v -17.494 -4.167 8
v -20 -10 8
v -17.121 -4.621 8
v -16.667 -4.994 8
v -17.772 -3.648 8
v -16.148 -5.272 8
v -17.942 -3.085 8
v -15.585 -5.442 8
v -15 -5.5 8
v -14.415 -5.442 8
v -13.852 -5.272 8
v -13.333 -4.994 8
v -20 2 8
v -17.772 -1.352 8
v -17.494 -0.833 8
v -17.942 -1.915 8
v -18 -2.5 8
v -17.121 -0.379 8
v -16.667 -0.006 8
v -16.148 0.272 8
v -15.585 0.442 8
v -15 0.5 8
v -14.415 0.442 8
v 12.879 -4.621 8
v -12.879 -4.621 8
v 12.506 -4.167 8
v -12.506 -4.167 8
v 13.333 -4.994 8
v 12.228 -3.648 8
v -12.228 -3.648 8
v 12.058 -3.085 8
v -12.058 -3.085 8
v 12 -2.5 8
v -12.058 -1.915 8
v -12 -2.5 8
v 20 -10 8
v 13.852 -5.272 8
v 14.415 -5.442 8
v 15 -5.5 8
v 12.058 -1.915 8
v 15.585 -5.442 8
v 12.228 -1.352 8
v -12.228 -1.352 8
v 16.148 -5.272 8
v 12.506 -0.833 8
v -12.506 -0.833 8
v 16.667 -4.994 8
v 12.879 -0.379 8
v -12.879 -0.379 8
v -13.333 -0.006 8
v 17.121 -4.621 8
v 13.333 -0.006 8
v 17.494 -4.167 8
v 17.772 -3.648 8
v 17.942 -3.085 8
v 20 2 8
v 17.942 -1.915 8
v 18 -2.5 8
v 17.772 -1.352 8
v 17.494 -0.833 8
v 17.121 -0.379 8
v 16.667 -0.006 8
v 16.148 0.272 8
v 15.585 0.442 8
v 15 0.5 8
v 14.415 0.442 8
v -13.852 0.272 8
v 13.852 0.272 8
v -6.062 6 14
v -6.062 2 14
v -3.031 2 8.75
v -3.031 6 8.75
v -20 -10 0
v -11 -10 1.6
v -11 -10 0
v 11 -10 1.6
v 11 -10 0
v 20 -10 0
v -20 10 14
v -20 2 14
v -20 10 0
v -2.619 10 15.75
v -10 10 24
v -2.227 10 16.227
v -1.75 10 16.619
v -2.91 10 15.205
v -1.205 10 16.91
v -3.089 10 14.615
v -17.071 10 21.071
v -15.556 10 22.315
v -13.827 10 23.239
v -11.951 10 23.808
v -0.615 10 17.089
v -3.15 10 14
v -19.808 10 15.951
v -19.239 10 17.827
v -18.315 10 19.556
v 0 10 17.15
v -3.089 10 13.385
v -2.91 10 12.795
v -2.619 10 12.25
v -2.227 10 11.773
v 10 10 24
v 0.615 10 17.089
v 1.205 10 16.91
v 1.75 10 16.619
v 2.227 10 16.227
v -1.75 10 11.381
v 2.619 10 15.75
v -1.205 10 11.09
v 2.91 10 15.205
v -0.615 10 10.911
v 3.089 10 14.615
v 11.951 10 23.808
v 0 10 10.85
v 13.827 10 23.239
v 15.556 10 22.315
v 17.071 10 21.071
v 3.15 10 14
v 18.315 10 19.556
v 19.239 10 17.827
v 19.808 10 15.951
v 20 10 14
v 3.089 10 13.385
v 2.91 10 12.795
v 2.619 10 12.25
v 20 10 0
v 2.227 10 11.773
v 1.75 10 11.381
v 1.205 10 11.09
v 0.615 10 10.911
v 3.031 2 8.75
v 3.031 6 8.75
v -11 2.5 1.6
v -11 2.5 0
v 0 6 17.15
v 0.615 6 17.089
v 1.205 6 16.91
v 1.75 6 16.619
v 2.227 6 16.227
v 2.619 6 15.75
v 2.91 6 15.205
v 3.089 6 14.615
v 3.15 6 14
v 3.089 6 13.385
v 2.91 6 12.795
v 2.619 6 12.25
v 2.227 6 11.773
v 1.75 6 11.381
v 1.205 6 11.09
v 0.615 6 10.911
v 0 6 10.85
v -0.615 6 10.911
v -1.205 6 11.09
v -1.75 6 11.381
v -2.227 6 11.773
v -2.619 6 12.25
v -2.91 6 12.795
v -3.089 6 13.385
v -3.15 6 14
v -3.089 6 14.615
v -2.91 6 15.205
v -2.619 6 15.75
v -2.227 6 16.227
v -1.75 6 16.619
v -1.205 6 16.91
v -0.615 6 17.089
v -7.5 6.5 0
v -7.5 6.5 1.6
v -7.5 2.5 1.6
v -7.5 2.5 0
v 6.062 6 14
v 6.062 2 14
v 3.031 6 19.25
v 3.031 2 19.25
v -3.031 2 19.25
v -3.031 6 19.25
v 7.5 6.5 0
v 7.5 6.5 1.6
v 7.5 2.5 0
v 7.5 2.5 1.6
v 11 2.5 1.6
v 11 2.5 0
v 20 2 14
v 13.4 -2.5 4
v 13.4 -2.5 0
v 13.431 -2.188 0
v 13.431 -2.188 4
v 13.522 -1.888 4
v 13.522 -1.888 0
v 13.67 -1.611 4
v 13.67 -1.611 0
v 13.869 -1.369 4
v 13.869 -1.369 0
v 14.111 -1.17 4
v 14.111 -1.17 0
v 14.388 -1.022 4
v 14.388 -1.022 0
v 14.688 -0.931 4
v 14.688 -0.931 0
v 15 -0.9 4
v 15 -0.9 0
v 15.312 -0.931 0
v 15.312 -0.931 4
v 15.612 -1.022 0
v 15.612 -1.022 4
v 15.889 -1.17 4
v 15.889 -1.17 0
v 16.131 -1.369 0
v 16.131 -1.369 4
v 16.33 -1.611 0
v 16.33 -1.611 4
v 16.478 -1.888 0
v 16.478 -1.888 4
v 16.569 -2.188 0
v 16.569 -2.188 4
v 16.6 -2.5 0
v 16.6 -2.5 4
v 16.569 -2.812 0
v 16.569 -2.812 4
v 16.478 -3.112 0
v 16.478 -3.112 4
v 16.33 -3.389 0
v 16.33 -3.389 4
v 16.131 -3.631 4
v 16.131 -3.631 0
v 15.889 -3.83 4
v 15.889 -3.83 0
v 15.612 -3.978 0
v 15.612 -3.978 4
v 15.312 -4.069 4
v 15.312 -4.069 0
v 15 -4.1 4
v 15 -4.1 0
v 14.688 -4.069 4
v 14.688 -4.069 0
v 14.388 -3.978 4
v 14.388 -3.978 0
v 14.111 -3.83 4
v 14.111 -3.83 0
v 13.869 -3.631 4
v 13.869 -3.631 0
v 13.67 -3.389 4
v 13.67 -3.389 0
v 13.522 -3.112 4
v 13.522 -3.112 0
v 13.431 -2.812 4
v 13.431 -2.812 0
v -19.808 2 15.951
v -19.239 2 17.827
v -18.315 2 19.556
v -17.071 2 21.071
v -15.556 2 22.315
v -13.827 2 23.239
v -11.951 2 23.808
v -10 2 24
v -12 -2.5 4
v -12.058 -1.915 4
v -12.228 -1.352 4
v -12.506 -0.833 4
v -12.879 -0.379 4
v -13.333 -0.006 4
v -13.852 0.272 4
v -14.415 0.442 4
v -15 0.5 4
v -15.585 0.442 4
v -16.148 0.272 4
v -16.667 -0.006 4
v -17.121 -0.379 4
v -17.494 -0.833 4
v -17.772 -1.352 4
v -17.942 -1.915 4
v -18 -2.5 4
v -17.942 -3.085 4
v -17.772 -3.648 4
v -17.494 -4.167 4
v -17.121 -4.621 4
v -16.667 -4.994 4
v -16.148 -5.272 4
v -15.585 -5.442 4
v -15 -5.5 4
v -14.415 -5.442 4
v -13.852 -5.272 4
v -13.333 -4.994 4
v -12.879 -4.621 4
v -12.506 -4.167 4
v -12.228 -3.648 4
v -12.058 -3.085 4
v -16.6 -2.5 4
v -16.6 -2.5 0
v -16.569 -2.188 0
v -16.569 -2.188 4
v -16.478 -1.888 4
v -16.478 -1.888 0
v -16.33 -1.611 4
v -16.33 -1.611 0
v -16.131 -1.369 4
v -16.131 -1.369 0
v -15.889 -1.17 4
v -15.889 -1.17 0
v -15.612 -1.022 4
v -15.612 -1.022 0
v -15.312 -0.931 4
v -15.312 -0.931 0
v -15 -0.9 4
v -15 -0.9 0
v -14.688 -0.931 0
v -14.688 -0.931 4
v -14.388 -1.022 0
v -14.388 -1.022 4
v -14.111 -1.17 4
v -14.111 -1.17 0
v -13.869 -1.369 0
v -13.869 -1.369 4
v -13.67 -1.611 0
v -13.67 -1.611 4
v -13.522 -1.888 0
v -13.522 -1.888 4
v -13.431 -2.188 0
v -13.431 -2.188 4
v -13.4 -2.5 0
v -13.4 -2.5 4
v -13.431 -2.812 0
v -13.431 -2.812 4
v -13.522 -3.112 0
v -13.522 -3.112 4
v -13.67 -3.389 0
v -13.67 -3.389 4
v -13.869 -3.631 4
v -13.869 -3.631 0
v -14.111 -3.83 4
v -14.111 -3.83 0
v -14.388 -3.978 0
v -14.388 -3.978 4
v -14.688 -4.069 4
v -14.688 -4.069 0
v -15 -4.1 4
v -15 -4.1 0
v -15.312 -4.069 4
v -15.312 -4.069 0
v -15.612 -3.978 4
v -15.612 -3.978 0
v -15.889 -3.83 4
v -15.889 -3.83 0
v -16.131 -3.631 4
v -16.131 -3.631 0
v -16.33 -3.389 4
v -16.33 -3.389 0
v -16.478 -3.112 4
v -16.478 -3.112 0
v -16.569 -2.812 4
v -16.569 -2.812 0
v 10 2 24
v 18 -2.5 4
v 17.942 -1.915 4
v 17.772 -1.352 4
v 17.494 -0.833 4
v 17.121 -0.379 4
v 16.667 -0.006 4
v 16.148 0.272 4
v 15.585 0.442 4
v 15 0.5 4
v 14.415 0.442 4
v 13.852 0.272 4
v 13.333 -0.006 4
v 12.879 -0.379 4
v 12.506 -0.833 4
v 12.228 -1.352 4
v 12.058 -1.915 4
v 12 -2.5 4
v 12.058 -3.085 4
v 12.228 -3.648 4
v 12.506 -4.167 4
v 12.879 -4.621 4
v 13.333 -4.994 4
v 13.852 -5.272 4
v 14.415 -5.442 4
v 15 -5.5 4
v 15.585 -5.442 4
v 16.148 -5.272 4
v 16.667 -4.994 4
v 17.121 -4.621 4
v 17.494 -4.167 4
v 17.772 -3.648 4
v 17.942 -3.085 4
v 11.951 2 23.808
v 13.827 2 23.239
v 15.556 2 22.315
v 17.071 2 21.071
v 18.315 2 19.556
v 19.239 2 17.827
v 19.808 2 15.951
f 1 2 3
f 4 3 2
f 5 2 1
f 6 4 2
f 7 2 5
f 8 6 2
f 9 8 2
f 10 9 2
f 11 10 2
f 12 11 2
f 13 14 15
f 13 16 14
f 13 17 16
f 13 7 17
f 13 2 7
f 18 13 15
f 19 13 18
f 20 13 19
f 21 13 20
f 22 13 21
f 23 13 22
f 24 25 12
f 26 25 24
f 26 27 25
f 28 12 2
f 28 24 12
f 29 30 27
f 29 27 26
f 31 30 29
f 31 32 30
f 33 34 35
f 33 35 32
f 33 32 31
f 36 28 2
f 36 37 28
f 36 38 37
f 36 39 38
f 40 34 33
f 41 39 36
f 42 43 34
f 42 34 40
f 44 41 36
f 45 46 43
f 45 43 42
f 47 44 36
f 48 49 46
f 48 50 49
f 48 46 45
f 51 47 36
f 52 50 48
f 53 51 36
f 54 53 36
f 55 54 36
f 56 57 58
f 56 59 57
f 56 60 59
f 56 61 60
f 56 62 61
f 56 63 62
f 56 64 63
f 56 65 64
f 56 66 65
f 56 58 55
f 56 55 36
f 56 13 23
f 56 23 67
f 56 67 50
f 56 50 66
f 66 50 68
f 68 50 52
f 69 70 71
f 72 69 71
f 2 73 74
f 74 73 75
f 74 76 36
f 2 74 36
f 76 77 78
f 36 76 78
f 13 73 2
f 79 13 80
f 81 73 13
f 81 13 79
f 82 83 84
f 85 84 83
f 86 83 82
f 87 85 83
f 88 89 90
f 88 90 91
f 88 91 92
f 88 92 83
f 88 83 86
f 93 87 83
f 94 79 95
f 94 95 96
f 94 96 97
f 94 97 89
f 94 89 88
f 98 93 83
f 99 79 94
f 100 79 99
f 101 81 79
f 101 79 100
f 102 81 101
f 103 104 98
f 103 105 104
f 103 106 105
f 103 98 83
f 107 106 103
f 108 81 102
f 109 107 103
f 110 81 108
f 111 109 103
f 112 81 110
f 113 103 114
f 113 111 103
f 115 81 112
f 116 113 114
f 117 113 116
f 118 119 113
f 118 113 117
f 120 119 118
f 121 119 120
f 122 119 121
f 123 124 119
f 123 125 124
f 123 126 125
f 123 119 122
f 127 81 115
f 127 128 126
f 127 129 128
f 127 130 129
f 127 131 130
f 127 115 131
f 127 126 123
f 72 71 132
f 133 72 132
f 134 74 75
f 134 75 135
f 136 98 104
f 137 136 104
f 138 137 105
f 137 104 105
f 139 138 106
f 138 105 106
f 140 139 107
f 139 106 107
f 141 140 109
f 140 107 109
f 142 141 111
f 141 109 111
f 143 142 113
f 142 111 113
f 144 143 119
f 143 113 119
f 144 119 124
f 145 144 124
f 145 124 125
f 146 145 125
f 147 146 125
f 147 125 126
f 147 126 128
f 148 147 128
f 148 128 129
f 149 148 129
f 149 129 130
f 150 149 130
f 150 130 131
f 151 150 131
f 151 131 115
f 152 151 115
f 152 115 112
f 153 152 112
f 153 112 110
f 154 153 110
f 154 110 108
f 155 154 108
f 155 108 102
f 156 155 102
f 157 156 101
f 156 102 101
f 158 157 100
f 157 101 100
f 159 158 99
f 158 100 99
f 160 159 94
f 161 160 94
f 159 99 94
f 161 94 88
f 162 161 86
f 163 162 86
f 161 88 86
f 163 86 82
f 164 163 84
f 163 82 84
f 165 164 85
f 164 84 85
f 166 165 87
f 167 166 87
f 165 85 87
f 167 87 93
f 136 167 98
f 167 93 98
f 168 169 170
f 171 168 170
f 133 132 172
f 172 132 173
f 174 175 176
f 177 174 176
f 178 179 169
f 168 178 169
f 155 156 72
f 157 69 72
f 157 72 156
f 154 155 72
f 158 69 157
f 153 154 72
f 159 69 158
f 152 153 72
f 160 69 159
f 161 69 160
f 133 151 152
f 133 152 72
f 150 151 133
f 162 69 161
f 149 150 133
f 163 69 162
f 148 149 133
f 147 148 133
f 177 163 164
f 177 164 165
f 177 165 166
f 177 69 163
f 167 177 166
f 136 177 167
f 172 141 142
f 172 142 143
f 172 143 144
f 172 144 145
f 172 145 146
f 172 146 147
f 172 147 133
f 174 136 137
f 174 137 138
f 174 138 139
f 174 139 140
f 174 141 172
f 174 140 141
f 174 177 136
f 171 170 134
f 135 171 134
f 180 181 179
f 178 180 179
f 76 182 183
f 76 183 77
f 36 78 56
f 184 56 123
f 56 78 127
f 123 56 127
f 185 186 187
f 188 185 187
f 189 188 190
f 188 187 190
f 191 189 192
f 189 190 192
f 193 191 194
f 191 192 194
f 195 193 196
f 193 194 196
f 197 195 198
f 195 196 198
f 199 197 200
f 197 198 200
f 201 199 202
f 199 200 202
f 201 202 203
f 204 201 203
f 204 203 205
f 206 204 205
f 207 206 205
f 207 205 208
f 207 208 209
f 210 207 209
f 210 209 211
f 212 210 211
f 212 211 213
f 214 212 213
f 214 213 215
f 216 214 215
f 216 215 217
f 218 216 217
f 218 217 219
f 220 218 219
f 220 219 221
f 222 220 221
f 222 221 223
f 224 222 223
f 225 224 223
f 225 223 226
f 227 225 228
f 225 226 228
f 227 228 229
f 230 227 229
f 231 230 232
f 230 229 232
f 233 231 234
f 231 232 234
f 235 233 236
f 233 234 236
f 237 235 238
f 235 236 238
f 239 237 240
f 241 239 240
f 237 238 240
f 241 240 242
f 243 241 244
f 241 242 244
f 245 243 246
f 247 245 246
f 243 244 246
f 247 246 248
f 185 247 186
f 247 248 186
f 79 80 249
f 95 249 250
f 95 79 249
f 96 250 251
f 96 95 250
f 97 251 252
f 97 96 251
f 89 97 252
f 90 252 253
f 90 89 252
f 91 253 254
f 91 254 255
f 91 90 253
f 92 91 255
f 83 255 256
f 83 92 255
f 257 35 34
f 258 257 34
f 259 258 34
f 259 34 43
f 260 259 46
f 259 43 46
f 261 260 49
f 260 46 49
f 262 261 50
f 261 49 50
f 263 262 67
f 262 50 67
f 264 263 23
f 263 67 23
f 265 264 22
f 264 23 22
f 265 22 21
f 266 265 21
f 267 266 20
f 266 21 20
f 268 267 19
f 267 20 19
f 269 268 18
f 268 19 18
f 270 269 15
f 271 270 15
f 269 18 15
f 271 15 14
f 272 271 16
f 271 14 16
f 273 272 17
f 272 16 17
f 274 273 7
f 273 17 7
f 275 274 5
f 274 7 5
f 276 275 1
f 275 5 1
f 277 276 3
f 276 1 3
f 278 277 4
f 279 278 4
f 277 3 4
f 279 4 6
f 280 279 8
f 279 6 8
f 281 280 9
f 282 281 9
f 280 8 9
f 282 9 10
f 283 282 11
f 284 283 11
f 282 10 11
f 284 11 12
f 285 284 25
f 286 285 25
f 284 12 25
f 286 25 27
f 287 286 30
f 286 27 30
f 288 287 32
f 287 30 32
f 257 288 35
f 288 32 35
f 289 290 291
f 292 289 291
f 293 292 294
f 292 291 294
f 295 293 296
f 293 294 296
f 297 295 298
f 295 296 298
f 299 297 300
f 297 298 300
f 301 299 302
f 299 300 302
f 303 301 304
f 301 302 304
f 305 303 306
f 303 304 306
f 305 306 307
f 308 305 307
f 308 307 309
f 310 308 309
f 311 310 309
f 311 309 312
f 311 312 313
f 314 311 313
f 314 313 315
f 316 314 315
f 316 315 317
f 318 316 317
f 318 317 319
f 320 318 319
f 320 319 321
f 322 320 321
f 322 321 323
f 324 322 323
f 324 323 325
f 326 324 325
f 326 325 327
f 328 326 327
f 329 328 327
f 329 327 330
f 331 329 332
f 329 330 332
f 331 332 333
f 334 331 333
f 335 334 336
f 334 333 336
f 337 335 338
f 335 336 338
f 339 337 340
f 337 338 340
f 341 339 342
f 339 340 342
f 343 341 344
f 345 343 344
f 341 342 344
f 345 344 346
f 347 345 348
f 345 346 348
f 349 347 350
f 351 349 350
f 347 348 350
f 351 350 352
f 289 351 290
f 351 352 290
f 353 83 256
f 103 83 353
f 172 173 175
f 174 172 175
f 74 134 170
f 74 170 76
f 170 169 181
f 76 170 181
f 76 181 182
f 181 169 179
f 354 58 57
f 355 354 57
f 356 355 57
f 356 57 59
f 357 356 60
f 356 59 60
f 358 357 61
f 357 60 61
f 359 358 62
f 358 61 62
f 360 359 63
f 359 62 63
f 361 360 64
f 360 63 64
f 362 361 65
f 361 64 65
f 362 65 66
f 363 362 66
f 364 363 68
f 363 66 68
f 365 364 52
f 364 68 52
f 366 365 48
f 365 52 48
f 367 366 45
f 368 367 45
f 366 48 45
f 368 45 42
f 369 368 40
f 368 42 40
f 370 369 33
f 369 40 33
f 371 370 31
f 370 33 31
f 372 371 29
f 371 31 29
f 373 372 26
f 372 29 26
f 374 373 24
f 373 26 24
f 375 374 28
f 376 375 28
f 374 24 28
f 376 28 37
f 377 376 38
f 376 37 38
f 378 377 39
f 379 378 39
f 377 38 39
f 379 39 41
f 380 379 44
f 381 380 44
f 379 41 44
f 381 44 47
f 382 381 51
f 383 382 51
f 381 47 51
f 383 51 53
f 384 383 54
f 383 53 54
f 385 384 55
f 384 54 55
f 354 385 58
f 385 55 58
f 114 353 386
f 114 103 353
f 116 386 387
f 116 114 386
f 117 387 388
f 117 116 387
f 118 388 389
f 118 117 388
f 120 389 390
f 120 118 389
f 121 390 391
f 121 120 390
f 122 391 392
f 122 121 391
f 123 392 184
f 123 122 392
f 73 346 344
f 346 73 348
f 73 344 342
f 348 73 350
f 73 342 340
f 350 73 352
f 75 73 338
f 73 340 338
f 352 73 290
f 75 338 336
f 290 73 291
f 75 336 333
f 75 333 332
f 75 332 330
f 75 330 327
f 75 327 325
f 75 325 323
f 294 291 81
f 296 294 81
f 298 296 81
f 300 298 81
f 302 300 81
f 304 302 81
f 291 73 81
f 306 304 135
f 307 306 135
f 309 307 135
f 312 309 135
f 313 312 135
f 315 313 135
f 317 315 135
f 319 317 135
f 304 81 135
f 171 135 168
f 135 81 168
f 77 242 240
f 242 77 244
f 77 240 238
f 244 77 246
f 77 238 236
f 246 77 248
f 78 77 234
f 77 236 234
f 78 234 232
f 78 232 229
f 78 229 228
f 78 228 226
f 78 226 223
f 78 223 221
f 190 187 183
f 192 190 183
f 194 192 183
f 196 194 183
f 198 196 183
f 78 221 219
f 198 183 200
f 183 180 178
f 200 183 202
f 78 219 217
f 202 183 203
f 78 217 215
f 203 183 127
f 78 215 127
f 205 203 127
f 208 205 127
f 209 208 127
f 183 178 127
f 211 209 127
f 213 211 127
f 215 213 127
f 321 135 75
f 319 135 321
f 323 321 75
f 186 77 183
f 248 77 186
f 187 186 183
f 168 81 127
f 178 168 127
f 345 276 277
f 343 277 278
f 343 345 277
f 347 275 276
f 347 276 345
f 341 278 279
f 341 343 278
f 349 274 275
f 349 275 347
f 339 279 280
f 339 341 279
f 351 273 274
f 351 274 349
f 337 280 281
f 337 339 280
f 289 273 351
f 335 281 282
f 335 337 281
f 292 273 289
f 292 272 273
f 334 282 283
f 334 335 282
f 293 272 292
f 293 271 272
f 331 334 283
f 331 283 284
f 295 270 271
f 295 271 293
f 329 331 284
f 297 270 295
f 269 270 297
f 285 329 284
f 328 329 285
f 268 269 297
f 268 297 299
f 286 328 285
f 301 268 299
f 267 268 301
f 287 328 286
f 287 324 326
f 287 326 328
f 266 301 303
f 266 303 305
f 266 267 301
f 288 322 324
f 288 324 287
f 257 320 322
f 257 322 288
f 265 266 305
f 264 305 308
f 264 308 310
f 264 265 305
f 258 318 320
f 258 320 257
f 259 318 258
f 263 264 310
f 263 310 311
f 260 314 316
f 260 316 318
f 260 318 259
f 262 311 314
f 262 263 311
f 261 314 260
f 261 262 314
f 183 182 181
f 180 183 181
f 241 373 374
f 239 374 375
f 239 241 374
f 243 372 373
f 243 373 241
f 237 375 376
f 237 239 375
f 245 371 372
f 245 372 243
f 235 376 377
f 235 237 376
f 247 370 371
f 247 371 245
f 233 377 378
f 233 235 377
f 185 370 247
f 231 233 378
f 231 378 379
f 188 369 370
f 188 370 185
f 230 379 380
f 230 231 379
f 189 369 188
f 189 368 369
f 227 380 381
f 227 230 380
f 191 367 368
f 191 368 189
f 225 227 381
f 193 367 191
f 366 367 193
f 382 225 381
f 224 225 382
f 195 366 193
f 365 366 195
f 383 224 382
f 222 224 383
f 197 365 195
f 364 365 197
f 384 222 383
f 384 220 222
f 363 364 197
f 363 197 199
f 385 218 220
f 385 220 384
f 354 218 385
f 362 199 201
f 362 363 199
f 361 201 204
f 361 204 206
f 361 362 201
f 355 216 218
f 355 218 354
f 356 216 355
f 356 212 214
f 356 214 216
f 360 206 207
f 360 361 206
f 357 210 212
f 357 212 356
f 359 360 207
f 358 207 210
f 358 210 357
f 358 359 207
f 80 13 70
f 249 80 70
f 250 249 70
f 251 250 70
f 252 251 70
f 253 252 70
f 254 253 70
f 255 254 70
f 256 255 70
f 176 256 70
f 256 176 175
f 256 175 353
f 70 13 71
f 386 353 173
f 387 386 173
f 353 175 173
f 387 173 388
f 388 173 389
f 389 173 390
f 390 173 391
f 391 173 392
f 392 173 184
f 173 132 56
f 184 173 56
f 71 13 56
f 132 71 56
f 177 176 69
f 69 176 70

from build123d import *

# Parameters (mm, degrees)
SKETCH1_W               = 40
SKETCH1_H               = 20
BOSS_EXTRUDE1_DEPTH     = 8
SKETCH2_W               = 40
SKETCH2_H               = 8
BOSS_EXTRUDE2_DEPTH     = 16
SKETCH4_R               = 3.15
CUT_EXTRUDE1_DEPTH      = 38.094473982
SKETCH5_R               = 1.6
CUT_EXTRUDE2_DEPTH      = 8
SKETCH6_R               = 1.6
CUT_EXTRUDE3_DEPTH      = 8
CUT_EXTRUDE4_DEPTH      = 33.802438934
CUT_EXTRUDE4_DEPTH_BACK = 1.6
SKETCH9_R               = 3
CUT_EXTRUDE5_DEPTH      = 4
SKETCH10_R              = 3
CUT_EXTRUDE6_DEPTH      = 4
CUT_EXTRUDE7_DEPTH      = 4
FILLET1_R               = 10


with BuildPart() as part:
    # Sketch1 → Boss-Extrude1 (new body)
    with BuildSketch(Plane.XY):
        Rectangle(SKETCH1_W, SKETCH1_H)
    extrude(amount=BOSS_EXTRUDE1_DEPTH)

    # Sketch2 → Boss-Extrude2 (add)
    with BuildSketch(Plane.XY.offset(8)):
        with Locations((0, 6)):
            Rectangle(SKETCH2_W, SKETCH2_H)
    extrude(amount=BOSS_EXTRUDE2_DEPTH)

    # Sketch4 → Cut-Extrude1 (cut, through all)
    with BuildSketch(Plane(origin=(0, 10, 0), x_dir=(1, 0, 0), z_dir=(0, 1, 0))):
        with Locations(Location((0, -14, 0), (0, 0, 270))):
            Circle(SKETCH4_R)
    extrude(amount=-CUT_EXTRUDE1_DEPTH, mode=Mode.SUBTRACT)

    # Sketch5 → Cut-Extrude2 (cut)
    with BuildSketch(Plane(origin=(0, 0, 0), x_dir=(-1, 0, 0), z_dir=(0, 0, -1))):
        with Locations((-15, -2.5)):
            Circle(SKETCH5_R)
    extrude(amount=-CUT_EXTRUDE2_DEPTH, mode=Mode.SUBTRACT)

    # Sketch6 → Cut-Extrude3 (cut)
    with BuildSketch(Plane(origin=(0, 0, 0), x_dir=(-1, 0, 0), z_dir=(0, 0, -1))):
        with Locations((15, -2.5)):
            Circle(SKETCH6_R)
    extrude(amount=-CUT_EXTRUDE3_DEPTH, mode=Mode.SUBTRACT)

    # Sketch7 → Cut-Extrude4 (cut, two sides: drawn at the far end of the back side and taken through both)
    with BuildSketch(Plane(origin=(0, 0, 0), x_dir=(-1, 0, 0), z_dir=(0, 0, -1)).offset(-CUT_EXTRUDE4_DEPTH_BACK)):
        Polygon((-11, -93.783466983), (-11, -10), (-11, 2.5), (-7.5, 2.5), (-7.5, 6.5), (7.5, 6.5), (7.5, 2.5), (11, 2.5), (11, -10), (11, -93.783466983), (11, -261.350400948), (-11, -261.350400948), align=None)
    extrude(amount=CUT_EXTRUDE4_DEPTH + CUT_EXTRUDE4_DEPTH_BACK, mode=Mode.SUBTRACT)

    # Sketch9 → Cut-Extrude5 (cut)
    with BuildSketch(Plane.XY.offset(8)):
        with Locations((-15, -2.5)):
            Circle(SKETCH9_R)
    extrude(amount=-CUT_EXTRUDE5_DEPTH, mode=Mode.SUBTRACT)

    # Sketch10 → Cut-Extrude6 (cut)
    with BuildSketch(Plane.XY.offset(8)):
        with Locations((15, -2.5)):
            Circle(SKETCH10_R)
    extrude(amount=-CUT_EXTRUDE6_DEPTH, mode=Mode.SUBTRACT)

    # Sketch11 → Cut-Extrude7 (cut)
    with BuildSketch(Plane.XZ.offset(-2)):
        Polygon((6.062177826, 14), (3.031088913, 19.25), (-3.031088913, 19.25), (-6.062177826, 14), (-3.031088913, 8.75), (3.031088913, 8.75), align=None)
    extrude(amount=-CUT_EXTRUDE7_DEPTH, mode=Mode.SUBTRACT)

    # Fillet1
    fillet1_edges = [part.edges().sort_by_distance(p)[0] for p in [
        (-20, 6, 24),
        (20, 6, 24),
    ]]
    fillet(fillet1_edges, radius=FILLET1_R)


solid = part.part
